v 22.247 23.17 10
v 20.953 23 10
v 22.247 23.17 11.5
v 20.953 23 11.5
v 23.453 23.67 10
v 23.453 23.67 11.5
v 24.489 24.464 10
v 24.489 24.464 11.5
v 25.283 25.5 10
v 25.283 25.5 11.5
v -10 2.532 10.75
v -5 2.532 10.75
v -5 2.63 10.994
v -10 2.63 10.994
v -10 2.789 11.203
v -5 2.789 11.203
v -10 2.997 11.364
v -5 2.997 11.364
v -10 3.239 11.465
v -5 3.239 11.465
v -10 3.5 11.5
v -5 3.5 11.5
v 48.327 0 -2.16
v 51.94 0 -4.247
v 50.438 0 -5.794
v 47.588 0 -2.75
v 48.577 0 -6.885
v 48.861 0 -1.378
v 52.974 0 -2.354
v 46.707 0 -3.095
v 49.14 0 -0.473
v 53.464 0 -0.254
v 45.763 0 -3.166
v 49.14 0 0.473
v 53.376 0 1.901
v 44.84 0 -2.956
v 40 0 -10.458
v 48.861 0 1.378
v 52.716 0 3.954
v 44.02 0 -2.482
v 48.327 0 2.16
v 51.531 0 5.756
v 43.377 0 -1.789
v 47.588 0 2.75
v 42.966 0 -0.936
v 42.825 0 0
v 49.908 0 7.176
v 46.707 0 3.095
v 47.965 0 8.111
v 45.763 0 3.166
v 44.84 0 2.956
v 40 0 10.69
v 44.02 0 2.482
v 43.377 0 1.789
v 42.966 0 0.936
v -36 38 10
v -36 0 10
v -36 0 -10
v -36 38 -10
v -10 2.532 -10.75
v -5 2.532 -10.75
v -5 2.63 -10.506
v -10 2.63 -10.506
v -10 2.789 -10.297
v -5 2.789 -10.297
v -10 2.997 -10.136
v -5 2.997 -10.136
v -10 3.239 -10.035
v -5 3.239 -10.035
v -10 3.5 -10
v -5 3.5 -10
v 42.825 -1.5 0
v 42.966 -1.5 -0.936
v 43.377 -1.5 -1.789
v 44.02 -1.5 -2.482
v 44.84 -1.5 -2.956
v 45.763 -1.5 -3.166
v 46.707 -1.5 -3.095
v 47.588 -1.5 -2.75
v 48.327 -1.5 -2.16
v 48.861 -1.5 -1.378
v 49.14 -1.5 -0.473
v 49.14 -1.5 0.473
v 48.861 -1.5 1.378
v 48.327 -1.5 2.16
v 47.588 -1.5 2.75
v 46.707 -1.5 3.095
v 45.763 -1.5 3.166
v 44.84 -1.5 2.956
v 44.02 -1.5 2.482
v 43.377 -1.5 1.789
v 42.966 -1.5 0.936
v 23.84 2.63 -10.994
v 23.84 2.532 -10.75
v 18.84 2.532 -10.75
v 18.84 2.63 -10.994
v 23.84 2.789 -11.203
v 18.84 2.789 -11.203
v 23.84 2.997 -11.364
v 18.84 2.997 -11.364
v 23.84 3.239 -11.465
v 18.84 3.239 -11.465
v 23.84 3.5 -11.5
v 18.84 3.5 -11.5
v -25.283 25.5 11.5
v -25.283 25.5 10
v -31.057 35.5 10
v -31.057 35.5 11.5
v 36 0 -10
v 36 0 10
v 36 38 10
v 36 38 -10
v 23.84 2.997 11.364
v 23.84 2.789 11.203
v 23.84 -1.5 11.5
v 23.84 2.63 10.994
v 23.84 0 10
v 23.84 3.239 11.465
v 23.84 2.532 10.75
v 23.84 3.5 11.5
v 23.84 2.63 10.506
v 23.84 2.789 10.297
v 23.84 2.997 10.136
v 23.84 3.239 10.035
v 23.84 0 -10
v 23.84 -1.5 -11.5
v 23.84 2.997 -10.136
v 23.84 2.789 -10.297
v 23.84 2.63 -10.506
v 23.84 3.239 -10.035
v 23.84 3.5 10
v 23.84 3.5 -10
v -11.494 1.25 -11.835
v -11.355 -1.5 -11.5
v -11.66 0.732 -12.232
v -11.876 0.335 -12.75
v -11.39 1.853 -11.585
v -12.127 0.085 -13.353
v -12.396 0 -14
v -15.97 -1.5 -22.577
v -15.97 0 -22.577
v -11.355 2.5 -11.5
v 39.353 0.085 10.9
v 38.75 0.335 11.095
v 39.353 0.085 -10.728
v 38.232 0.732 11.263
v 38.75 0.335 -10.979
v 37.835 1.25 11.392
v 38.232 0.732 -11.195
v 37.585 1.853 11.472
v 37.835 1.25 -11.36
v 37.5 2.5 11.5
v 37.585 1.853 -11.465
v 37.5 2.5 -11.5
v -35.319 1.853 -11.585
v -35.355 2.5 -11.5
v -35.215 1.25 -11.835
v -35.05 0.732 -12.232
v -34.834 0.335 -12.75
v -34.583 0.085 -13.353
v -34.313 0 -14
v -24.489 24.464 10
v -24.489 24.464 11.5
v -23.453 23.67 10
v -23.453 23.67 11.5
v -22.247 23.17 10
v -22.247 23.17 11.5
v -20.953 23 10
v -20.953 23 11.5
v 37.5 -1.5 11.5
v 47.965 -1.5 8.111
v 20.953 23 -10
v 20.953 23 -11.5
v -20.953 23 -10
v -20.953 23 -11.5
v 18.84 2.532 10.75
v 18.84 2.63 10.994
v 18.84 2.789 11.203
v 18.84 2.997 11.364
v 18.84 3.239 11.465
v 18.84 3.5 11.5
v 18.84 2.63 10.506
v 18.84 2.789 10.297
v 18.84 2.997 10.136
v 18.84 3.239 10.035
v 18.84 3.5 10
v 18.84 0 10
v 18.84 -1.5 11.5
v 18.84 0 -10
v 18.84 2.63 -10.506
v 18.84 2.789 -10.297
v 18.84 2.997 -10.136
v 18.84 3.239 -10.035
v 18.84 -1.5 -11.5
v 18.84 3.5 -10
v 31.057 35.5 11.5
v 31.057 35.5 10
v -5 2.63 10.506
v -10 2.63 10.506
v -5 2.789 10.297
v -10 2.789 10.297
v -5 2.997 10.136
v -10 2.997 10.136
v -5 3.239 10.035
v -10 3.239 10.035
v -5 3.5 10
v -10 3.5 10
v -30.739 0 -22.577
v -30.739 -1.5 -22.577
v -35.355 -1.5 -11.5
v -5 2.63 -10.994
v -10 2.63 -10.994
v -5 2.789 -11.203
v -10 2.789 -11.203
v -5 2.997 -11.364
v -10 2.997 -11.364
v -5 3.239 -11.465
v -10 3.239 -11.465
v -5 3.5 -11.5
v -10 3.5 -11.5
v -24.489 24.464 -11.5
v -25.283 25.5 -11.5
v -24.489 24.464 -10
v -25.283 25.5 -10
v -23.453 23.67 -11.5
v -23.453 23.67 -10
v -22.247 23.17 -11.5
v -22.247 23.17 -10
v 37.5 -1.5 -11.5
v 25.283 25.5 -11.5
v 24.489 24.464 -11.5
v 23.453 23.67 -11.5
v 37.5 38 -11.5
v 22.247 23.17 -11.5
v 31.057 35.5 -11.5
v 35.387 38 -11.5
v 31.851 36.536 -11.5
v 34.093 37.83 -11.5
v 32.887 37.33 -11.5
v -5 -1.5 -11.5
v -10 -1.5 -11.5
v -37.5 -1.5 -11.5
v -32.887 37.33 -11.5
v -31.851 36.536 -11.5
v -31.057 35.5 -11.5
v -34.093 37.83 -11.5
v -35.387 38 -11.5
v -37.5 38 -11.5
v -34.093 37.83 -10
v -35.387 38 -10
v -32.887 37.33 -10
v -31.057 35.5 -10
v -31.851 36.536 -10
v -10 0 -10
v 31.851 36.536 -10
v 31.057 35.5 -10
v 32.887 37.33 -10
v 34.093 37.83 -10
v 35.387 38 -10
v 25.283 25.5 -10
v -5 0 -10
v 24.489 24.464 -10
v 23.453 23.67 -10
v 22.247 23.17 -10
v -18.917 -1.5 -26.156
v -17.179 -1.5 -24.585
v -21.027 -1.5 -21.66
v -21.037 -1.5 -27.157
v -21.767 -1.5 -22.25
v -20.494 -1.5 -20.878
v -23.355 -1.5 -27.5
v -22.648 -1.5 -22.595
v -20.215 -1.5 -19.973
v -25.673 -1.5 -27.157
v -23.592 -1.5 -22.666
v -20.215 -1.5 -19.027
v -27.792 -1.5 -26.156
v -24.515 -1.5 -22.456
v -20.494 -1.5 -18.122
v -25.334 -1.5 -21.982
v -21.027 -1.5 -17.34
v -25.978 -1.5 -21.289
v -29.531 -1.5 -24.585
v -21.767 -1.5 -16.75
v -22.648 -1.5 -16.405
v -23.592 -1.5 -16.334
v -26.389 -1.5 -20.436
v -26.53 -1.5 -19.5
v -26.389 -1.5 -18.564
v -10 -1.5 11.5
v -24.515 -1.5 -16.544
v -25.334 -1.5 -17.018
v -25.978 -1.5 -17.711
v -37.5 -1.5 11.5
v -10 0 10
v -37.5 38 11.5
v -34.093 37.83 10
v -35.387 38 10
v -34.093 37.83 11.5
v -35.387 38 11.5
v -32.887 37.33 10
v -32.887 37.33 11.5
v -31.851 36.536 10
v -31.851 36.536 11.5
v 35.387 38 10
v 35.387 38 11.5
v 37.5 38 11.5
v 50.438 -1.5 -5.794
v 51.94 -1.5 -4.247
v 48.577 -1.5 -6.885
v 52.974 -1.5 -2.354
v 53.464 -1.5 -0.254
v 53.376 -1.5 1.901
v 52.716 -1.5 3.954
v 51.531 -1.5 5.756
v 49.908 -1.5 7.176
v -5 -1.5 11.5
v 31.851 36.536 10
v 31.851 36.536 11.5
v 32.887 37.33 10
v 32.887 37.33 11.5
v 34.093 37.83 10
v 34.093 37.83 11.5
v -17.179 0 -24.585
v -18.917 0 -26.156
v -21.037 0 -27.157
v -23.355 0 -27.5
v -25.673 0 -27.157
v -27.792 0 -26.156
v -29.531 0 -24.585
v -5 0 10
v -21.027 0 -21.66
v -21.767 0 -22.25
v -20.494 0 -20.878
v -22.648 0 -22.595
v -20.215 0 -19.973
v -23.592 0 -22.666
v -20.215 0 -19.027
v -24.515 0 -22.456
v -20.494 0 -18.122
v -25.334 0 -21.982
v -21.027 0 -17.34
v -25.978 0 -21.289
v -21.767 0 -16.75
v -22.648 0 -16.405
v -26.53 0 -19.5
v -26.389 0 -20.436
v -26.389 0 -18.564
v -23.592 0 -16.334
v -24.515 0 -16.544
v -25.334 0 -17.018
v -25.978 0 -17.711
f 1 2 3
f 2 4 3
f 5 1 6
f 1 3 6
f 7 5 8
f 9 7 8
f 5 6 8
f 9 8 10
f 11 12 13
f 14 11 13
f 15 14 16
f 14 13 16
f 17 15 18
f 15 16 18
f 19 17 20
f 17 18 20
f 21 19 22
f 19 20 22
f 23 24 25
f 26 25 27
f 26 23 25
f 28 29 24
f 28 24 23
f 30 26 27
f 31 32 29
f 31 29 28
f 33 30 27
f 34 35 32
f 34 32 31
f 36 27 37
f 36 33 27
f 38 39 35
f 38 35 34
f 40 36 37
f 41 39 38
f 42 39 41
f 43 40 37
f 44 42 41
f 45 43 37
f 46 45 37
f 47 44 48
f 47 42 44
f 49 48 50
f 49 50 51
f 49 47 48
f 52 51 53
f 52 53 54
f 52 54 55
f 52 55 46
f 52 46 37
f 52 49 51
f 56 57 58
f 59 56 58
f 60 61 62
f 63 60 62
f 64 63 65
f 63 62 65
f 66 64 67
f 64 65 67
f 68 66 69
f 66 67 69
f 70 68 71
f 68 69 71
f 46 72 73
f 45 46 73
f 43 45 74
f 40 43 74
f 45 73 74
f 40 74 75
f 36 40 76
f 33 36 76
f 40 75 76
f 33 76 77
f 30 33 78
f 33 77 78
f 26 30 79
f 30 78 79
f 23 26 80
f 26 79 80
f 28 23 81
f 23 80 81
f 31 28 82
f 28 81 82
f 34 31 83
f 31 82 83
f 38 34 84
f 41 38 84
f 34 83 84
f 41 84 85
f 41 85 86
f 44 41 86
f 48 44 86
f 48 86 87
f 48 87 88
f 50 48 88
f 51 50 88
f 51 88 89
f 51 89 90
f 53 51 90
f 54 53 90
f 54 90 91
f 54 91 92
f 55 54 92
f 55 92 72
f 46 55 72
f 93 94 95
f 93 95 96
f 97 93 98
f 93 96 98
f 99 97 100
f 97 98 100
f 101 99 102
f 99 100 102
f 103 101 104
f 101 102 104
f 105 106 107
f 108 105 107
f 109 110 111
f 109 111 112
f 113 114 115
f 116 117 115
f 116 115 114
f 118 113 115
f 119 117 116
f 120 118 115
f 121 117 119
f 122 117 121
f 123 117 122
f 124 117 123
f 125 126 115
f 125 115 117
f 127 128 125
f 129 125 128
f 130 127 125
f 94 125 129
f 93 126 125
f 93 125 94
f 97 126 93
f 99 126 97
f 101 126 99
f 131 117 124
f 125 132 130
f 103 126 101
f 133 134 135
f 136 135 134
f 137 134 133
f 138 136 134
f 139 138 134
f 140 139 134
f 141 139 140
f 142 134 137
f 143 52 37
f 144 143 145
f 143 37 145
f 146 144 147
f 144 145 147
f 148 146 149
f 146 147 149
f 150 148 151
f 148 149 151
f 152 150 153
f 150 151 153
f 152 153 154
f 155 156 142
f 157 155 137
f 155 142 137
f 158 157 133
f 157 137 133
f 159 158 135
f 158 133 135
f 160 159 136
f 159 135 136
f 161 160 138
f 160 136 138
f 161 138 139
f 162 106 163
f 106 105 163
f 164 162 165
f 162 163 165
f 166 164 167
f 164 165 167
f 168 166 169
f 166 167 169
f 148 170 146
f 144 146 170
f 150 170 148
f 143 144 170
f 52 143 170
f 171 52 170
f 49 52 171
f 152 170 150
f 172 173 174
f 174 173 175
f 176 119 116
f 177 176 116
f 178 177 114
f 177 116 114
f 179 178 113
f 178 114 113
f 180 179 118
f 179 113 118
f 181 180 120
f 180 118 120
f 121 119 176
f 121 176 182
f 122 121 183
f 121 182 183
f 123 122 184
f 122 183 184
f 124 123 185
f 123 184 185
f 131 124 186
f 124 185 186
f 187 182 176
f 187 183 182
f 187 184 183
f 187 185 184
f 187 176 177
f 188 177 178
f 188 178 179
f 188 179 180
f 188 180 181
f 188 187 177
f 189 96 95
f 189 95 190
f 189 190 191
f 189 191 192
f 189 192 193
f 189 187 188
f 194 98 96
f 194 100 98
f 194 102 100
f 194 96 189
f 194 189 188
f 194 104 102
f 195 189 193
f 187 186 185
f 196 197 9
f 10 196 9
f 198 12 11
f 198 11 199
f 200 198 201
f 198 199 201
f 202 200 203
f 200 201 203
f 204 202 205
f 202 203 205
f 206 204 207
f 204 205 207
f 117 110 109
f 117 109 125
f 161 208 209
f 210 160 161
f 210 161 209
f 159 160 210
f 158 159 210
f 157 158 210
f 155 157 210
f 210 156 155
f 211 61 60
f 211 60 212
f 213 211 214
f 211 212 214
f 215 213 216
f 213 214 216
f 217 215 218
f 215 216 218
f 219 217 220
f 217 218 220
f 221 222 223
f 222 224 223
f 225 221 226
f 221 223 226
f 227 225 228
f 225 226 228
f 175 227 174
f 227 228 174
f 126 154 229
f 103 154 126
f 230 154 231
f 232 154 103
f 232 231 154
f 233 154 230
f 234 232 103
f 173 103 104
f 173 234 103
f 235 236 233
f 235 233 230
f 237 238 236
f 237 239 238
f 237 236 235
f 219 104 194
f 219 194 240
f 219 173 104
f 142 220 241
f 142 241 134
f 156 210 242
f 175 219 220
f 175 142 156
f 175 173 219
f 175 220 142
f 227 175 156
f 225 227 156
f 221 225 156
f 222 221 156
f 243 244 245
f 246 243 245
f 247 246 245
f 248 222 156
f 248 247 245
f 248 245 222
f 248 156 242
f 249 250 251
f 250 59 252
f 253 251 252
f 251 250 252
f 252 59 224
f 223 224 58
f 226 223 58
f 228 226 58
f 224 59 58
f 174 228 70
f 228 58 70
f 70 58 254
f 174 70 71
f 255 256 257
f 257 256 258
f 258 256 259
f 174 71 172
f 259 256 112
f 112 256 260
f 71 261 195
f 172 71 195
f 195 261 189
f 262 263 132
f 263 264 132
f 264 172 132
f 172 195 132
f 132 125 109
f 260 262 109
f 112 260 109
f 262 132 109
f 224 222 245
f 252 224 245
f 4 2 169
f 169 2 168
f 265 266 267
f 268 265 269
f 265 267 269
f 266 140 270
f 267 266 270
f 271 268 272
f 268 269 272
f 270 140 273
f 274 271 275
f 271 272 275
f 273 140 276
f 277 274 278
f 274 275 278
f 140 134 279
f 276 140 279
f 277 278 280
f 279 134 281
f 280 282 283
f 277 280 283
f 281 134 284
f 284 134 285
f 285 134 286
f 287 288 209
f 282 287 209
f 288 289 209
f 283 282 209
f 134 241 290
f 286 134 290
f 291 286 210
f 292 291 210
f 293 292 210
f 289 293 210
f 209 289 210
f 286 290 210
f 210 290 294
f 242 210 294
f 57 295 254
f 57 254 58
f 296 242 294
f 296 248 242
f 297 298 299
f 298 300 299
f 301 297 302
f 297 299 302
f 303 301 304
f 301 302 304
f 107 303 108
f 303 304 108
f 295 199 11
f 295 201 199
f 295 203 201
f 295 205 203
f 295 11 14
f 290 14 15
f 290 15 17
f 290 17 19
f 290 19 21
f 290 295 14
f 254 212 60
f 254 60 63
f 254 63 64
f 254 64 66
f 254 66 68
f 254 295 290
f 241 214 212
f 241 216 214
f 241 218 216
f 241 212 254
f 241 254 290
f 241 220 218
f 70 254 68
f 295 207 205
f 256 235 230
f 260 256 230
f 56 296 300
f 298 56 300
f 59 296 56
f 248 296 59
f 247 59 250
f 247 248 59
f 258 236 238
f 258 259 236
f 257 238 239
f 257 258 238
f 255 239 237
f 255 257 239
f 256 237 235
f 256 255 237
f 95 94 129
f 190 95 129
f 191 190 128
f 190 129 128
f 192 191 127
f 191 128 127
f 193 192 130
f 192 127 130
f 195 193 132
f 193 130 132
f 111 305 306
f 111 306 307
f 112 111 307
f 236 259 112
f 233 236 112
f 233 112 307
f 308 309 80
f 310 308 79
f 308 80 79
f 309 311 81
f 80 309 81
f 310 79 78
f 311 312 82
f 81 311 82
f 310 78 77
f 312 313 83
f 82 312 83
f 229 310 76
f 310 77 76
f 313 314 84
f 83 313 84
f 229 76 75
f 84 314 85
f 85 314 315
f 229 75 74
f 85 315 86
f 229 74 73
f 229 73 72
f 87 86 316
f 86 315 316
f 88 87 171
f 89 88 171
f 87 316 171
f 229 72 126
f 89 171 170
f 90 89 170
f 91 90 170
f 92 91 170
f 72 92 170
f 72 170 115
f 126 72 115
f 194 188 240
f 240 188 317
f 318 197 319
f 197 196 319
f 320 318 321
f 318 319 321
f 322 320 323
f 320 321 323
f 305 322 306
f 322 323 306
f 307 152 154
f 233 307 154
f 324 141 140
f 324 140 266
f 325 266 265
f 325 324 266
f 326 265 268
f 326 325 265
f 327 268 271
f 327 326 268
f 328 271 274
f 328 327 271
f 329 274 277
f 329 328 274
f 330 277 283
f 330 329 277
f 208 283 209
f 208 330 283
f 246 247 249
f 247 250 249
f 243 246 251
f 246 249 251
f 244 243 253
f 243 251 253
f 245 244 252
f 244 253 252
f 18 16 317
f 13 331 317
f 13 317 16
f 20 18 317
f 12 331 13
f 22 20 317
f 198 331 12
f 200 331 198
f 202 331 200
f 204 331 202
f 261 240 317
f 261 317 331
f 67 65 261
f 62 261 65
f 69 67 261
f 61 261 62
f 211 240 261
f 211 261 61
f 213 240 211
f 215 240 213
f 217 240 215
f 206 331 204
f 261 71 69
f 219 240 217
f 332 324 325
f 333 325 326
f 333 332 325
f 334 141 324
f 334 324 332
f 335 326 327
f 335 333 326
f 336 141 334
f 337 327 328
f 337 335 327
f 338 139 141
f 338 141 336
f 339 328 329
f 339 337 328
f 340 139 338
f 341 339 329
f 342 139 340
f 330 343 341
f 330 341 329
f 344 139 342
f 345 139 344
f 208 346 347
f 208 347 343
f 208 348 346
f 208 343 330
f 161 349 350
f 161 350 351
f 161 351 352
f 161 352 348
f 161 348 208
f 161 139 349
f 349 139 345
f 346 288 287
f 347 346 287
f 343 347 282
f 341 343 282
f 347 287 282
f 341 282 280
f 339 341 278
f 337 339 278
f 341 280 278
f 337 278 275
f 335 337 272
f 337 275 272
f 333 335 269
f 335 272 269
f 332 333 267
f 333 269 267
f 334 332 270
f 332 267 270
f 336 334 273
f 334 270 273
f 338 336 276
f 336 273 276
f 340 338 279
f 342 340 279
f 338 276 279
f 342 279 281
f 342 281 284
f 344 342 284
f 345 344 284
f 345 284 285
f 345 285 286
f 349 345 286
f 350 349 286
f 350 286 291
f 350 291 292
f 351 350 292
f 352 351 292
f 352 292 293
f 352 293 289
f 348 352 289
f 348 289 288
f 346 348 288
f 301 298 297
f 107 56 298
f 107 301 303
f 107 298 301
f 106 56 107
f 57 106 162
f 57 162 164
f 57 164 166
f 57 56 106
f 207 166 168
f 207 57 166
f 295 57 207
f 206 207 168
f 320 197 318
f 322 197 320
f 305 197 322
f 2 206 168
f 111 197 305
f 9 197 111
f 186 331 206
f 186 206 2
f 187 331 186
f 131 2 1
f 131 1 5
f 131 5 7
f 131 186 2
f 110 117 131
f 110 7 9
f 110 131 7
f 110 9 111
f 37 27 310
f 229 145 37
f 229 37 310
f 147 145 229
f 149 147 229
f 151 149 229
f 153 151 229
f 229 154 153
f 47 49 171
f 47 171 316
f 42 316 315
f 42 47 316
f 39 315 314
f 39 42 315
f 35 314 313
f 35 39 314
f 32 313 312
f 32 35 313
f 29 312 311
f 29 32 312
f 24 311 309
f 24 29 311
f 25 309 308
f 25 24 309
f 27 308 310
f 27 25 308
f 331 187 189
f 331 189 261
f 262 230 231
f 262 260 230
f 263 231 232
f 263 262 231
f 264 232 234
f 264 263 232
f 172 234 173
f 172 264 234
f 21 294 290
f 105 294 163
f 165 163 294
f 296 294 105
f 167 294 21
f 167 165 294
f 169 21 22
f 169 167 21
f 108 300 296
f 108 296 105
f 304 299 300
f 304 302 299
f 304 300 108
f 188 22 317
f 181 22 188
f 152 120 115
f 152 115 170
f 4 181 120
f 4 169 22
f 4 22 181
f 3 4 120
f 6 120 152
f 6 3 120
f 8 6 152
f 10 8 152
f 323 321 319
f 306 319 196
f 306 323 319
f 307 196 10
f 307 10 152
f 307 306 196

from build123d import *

# Parameters (mm, degrees)
SKETCH15_W                  = 75
SKETCH15_H                  = 23
SKETCH15_W_2                = 72
SKETCH15_H_2                = 20
BOSS_EXTRUDE8_DEPTH         = 38
BOSS_EXTRUDE11_DEPTH        = 1.5
F_1_4_0_25_DIAMETER_HOLE1_D = 6.35
SKETCH21_W                  = 5
SKETCH21_H                  = 4
CUT_EXTRUDE1_DEPTH          = 70.535961919
FILLET1_R                   = 5
FILLET2_R                   = 1
FILLET3_R                   = 2.5


with BuildPart() as part:
    # Sketch15 → Boss-Extrude8 (new body)
    with BuildSketch(Plane(origin=(0, 0, 0), x_dir=(1, 0, 0), z_dir=(0, 1, 0))):
        Rectangle(SKETCH15_W, SKETCH15_H)
        Rectangle(SKETCH15_W_2, SKETCH15_H_2, mode=Mode.SUBTRACT)
    extrude(amount=BOSS_EXTRUDE8_DEPTH)

    # Sketch18 → Boss-Extrude11 (add)
    with BuildSketch(Plane.XZ):
        with BuildLine():
            Line((-37.5, 11.5), (37.5, 11.5))
            Line((37.5, 11.5), (47.964864865, 8.110810811))
            ThreePointArc((47.964864865, 8.110810811), (53.493344425, 0.826258956), (48.576923077, -6.884615385))
            Line((48.576923077, -6.884615385), (37.5, -11.5))
            Line((37.5, -11.5), (-11.354744065, -11.5))
            Line((-11.354744065, -11.5), (-15.970166575, -22.576940483))
            ThreePointArc((-15.970166575, -22.576940483), (-23.354774707, -27.5), (-30.739382839, -22.576940483))
            Line((-30.739382839, -22.576940483), (-35.35480535, -11.5))
            Line((-35.35480535, -11.5), (-37.5, -11.5))
            Line((-37.5, -11.5), (-37.5, 11.5))
        make_face()
    extrude(amount=BOSS_EXTRUDE11_DEPTH)

    # 1/4 (0.25) Diameter Hole1 (through all)
    with Locations(Plane(origin=(0, 0, 0), x_dir=(1, 0, 0), z_dir=(0, 1, 0))):
        with Locations((46, 0), (-23.354774707, 19.5)):
            Hole(F_1_4_0_25_DIAMETER_HOLE1_D / 2)

    # Sketch21 → Cut-Extrude1 (cut, through all)
    with BuildSketch(Plane(origin=(0, 0, -11.5), x_dir=(-1, 0, 0), z_dir=(0, 0, -1))):
        Polygon((-32.5, 38), (-23.839745962, 23), (23.839745962, 23), (32.5, 38), align=None)
        with Locations((-21.339745962, 0.5)):
            Rectangle(SKETCH21_W, SKETCH21_H)
        with Locations((7.5, 0.5)):
            Rectangle(SKETCH21_W, SKETCH21_H)
    extrude(amount=-CUT_EXTRUDE1_DEPTH, mode=Mode.SUBTRACT)

    # Fillet1
    fillet1_edges = [part.edges().sort_by_distance(p)[0] for p in [
        (32.5, 38, -10.75),
        (-32.5, 38, -10.75),
        (-23.839745962, 23, -10.75),
        (23.839745962, 23, -10.75),
        (32.5, 38, 10.75),
        (-32.5, 38, 10.75),
        (-23.839745962, 23, 10.75),
        (23.839745962, 23, 10.75),
    ]]
    fillet(fillet1_edges, radius=FILLET1_R)

    # Fillet2
    # the kernel refuses this fillet: 1 mm, written as the material it takes off along each edge
    with BuildSketch(Plane(origin=(18.839745962, 2.5, -11.5), x_dir=(0, 1, 0), z_dir=(1, 0, 0)), Plane(origin=(23.839745962, 2.5, -10), x_dir=(0, 1, 0), z_dir=(-1, 0, 0)), Plane(origin=(18.839745962, 2.5, 10), x_dir=(0, 1, 0), z_dir=(1, 0, 0)), Plane(origin=(23.839745962, 2.5, 11.5), x_dir=(0, 1, 0), z_dir=(-1, 0, 0)), Plane(origin=(-10, 2.5, -11.5), x_dir=(0, 1, 0), z_dir=(1, 0, 0)), Plane(origin=(-5, 2.5, -10), x_dir=(0, 1, 0), z_dir=(-1, 0, 0)), Plane(origin=(-10, 2.5, 10), x_dir=(0, 1, 0), z_dir=(1, 0, 0)), Plane(origin=(-5, 2.5, 11.5), x_dir=(0, 1, 0), z_dir=(-1, 0, 0))) as fillet2_piece_1:
        with BuildLine():
            CenterArc((FILLET2_R, FILLET2_R), FILLET2_R, 180, 90)
            Line((0, FILLET2_R), (0, 0))
            Line((0, 0), (FILLET2_R, 0))
        make_face()
    extrude(amount=5, mode=Mode.SUBTRACT)

    # Fillet3
    fillet3_edges = [part.edges().sort_by_distance(p)[0] for p in [
        (-23.354774707, 0, -11.5),
        (37.5, 0, 0),
    ]]
    fillet(fillet3_edges, radius=FILLET3_R)


solid = part.part
